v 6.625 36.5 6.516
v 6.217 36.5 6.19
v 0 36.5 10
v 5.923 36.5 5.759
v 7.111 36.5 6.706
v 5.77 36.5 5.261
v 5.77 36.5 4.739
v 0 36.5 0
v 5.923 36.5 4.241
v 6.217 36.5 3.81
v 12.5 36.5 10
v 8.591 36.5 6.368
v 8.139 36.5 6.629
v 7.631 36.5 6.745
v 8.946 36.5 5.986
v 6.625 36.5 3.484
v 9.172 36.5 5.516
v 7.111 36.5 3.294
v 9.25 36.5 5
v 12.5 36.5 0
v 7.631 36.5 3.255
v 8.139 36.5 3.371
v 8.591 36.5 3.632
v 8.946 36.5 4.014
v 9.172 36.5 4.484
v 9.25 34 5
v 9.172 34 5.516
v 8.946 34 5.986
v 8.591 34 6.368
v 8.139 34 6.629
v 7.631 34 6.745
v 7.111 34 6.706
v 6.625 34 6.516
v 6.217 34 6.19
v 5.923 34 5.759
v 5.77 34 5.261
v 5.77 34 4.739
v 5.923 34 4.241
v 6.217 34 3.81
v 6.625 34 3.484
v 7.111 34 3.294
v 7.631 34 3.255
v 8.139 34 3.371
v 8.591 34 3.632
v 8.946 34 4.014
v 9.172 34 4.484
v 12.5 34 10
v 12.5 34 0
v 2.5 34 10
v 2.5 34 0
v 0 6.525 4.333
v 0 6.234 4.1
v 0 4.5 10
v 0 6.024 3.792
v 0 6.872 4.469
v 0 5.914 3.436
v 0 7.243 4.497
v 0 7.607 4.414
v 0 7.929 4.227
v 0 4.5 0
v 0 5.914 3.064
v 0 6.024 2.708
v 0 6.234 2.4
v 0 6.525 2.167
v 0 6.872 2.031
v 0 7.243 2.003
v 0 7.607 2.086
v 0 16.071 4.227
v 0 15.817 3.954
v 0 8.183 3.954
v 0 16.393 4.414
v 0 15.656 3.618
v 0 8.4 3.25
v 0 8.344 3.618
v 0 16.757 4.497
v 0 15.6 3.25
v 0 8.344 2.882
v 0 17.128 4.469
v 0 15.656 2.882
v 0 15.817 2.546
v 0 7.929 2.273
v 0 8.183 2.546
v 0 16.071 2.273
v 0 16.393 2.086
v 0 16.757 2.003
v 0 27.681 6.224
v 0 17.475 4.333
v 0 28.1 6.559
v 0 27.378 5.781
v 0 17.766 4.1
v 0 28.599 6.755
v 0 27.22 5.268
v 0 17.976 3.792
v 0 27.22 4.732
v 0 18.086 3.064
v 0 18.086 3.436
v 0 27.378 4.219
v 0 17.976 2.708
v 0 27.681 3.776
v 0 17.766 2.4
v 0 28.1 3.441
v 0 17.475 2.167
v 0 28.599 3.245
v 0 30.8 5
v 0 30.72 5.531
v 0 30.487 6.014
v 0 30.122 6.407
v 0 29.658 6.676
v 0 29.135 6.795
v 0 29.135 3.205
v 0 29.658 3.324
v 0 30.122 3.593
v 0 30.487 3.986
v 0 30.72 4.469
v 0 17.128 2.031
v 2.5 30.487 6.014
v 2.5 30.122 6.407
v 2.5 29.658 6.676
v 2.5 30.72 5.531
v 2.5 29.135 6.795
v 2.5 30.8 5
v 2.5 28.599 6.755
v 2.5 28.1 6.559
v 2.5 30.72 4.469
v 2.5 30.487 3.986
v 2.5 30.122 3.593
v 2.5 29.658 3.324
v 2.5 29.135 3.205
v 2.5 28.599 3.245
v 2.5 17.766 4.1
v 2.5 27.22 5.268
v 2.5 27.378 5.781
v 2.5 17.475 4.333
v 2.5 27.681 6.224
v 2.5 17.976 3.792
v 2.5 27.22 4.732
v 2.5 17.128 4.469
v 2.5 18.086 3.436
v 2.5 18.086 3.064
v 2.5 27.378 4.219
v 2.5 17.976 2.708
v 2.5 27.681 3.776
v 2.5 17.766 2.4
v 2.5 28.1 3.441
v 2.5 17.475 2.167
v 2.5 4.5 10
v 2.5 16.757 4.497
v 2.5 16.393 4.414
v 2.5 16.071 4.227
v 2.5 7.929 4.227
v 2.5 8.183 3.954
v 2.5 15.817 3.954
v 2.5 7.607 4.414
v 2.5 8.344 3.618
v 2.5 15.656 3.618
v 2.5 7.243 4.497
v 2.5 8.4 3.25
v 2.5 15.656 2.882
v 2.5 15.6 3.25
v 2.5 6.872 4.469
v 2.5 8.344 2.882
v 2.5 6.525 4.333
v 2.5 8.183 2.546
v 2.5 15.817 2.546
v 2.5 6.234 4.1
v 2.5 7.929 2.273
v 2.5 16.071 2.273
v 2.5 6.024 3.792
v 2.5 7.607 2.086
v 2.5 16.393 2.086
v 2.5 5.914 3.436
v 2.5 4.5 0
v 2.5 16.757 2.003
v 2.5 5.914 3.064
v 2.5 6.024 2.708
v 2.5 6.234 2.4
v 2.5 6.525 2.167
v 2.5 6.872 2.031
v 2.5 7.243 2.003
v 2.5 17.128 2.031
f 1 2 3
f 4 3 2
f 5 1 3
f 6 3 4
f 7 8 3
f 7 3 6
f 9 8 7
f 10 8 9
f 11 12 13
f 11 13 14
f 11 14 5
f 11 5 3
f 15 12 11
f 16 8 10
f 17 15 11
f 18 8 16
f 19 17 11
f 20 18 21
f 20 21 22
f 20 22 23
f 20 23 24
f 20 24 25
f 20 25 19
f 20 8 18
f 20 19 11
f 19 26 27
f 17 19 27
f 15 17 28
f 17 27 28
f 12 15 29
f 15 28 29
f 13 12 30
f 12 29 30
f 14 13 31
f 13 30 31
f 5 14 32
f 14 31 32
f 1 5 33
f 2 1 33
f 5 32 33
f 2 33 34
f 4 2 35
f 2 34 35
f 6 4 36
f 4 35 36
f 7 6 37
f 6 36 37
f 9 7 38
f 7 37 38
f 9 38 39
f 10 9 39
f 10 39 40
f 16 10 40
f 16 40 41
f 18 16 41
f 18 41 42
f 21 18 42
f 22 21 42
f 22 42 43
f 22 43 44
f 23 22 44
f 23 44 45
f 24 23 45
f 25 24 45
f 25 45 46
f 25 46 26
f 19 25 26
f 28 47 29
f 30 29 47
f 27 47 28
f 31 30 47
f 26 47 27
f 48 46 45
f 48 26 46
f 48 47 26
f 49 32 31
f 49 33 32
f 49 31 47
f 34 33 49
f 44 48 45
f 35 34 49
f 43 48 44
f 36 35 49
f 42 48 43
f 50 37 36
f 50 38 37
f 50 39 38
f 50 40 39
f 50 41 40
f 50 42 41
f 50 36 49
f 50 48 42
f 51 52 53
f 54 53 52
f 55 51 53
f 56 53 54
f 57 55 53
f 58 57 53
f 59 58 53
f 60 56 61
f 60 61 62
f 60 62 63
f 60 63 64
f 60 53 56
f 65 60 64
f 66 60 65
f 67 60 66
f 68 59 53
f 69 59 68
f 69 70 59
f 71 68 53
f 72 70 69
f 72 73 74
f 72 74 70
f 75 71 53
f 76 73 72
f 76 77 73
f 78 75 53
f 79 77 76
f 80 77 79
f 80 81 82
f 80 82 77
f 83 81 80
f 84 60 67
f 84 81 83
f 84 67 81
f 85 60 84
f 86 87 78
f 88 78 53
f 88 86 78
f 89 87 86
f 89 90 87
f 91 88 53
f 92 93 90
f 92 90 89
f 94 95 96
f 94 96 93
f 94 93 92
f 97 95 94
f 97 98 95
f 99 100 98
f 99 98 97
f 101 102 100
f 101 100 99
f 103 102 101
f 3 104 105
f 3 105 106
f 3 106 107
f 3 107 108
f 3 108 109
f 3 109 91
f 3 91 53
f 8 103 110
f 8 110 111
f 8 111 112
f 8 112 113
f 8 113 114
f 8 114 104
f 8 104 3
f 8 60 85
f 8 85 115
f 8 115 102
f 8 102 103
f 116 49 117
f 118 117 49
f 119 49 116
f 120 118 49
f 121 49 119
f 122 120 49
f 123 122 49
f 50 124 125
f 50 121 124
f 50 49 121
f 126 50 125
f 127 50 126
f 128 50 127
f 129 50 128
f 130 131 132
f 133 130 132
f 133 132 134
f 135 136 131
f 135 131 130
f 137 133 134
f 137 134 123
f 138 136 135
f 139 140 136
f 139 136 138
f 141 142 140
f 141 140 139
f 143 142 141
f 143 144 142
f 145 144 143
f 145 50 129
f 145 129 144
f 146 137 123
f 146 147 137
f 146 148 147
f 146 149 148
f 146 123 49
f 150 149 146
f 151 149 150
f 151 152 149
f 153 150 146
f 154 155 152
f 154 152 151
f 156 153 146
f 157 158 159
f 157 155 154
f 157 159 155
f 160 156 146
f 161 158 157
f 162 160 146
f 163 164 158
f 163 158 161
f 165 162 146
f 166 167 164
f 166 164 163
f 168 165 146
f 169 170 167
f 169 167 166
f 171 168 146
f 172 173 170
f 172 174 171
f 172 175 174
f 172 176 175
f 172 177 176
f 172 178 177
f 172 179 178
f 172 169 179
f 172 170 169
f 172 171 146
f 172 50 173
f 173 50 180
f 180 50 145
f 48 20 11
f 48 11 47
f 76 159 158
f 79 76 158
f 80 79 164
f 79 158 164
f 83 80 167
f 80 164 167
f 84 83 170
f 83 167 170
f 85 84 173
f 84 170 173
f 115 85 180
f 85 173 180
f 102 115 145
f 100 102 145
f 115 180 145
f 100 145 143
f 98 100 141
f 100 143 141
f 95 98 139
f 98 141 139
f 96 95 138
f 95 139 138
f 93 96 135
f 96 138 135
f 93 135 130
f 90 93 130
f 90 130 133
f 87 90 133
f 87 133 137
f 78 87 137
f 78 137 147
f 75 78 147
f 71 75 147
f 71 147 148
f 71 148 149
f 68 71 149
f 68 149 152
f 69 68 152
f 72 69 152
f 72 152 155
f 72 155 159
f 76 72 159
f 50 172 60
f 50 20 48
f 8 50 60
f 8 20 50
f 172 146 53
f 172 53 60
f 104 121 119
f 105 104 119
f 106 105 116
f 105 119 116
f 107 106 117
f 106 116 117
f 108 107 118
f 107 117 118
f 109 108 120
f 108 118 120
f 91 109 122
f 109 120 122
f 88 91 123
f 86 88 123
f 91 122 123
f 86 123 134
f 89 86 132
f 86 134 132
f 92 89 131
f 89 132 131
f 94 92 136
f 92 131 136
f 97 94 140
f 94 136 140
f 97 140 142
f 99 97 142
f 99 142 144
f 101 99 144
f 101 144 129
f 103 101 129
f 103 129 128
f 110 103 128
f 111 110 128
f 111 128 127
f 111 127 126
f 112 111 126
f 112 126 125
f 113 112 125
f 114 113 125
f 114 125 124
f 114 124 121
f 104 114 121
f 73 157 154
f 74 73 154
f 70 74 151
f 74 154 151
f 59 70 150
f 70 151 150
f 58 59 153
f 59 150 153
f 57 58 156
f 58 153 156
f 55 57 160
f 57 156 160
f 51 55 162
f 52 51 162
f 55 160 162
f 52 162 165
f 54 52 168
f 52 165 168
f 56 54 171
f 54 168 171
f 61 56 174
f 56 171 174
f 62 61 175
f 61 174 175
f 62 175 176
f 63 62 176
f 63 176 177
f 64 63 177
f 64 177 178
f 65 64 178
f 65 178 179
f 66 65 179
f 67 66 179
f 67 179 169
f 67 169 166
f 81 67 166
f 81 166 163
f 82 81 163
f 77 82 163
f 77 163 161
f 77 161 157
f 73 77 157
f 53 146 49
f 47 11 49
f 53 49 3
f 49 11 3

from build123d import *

# Parameters (mm, degrees)
BOSS_EXTRUDE1_DEPTH = 10
SKETCH2_R           = 1.75
CUT_EXTRUDE1_DEPTH  = 10
SKETCH3_R           = 1.25
SKETCH3_R_2         = 1.8
CUT_EXTRUDE2_DEPTH  = 40.143965052
SKETCH4_W           = 13.022509218
SKETCH4_H           = 4.5
CUT_EXTRUDE3_DEPTH  = 40.143965052


with BuildPart() as part:
    # Sketch1 → Boss-Extrude1 (new body)
    with BuildSketch(Plane.XY):
        Polygon((0, 0), (0, 36.5), (12.5, 36.5), (12.5, 34), (2.5, 34), (2.5, 0), align=None)
    extrude(amount=BOSS_EXTRUDE1_DEPTH)

    # Sketch2 → Cut-Extrude1 (cut)
    with BuildSketch(Plane.XZ.offset(-34)):
        with Locations((7.5, 5)):
            Circle(SKETCH2_R)
    extrude(amount=-CUT_EXTRUDE1_DEPTH, mode=Mode.SUBTRACT)

    # Sketch3 → Cut-Extrude2 (cut, through all)
    with BuildSketch(Plane(origin=(2.5, 0, 0), x_dir=(0, 0, -1), z_dir=(1, 0, 0))):
        with Locations(Location((-3.25, 7.15, 0), (0, 0, 90))):
            Circle(SKETCH3_R)
        with Locations(Location((-3.25, 16.85, 0), (0, 0, 270))):
            Circle(SKETCH3_R)
        with Locations(Location((-5, 29, 0), (0, 0, 90))):
            Circle(SKETCH3_R_2)
    extrude(amount=-CUT_EXTRUDE2_DEPTH, mode=Mode.SUBTRACT)

    # Sketch4 → Cut-Extrude3 (cut, through all)
    with BuildSketch(Plane(origin=(2.5, 0, 0), x_dir=(0, 0, -1), z_dir=(1, 0, 0))):
        with Locations((-6.511254609, 2.25)):
            Rectangle(SKETCH4_W, SKETCH4_H)
    extrude(amount=-CUT_EXTRUDE3_DEPTH, mode=Mode.SUBTRACT)


solid = part.part
